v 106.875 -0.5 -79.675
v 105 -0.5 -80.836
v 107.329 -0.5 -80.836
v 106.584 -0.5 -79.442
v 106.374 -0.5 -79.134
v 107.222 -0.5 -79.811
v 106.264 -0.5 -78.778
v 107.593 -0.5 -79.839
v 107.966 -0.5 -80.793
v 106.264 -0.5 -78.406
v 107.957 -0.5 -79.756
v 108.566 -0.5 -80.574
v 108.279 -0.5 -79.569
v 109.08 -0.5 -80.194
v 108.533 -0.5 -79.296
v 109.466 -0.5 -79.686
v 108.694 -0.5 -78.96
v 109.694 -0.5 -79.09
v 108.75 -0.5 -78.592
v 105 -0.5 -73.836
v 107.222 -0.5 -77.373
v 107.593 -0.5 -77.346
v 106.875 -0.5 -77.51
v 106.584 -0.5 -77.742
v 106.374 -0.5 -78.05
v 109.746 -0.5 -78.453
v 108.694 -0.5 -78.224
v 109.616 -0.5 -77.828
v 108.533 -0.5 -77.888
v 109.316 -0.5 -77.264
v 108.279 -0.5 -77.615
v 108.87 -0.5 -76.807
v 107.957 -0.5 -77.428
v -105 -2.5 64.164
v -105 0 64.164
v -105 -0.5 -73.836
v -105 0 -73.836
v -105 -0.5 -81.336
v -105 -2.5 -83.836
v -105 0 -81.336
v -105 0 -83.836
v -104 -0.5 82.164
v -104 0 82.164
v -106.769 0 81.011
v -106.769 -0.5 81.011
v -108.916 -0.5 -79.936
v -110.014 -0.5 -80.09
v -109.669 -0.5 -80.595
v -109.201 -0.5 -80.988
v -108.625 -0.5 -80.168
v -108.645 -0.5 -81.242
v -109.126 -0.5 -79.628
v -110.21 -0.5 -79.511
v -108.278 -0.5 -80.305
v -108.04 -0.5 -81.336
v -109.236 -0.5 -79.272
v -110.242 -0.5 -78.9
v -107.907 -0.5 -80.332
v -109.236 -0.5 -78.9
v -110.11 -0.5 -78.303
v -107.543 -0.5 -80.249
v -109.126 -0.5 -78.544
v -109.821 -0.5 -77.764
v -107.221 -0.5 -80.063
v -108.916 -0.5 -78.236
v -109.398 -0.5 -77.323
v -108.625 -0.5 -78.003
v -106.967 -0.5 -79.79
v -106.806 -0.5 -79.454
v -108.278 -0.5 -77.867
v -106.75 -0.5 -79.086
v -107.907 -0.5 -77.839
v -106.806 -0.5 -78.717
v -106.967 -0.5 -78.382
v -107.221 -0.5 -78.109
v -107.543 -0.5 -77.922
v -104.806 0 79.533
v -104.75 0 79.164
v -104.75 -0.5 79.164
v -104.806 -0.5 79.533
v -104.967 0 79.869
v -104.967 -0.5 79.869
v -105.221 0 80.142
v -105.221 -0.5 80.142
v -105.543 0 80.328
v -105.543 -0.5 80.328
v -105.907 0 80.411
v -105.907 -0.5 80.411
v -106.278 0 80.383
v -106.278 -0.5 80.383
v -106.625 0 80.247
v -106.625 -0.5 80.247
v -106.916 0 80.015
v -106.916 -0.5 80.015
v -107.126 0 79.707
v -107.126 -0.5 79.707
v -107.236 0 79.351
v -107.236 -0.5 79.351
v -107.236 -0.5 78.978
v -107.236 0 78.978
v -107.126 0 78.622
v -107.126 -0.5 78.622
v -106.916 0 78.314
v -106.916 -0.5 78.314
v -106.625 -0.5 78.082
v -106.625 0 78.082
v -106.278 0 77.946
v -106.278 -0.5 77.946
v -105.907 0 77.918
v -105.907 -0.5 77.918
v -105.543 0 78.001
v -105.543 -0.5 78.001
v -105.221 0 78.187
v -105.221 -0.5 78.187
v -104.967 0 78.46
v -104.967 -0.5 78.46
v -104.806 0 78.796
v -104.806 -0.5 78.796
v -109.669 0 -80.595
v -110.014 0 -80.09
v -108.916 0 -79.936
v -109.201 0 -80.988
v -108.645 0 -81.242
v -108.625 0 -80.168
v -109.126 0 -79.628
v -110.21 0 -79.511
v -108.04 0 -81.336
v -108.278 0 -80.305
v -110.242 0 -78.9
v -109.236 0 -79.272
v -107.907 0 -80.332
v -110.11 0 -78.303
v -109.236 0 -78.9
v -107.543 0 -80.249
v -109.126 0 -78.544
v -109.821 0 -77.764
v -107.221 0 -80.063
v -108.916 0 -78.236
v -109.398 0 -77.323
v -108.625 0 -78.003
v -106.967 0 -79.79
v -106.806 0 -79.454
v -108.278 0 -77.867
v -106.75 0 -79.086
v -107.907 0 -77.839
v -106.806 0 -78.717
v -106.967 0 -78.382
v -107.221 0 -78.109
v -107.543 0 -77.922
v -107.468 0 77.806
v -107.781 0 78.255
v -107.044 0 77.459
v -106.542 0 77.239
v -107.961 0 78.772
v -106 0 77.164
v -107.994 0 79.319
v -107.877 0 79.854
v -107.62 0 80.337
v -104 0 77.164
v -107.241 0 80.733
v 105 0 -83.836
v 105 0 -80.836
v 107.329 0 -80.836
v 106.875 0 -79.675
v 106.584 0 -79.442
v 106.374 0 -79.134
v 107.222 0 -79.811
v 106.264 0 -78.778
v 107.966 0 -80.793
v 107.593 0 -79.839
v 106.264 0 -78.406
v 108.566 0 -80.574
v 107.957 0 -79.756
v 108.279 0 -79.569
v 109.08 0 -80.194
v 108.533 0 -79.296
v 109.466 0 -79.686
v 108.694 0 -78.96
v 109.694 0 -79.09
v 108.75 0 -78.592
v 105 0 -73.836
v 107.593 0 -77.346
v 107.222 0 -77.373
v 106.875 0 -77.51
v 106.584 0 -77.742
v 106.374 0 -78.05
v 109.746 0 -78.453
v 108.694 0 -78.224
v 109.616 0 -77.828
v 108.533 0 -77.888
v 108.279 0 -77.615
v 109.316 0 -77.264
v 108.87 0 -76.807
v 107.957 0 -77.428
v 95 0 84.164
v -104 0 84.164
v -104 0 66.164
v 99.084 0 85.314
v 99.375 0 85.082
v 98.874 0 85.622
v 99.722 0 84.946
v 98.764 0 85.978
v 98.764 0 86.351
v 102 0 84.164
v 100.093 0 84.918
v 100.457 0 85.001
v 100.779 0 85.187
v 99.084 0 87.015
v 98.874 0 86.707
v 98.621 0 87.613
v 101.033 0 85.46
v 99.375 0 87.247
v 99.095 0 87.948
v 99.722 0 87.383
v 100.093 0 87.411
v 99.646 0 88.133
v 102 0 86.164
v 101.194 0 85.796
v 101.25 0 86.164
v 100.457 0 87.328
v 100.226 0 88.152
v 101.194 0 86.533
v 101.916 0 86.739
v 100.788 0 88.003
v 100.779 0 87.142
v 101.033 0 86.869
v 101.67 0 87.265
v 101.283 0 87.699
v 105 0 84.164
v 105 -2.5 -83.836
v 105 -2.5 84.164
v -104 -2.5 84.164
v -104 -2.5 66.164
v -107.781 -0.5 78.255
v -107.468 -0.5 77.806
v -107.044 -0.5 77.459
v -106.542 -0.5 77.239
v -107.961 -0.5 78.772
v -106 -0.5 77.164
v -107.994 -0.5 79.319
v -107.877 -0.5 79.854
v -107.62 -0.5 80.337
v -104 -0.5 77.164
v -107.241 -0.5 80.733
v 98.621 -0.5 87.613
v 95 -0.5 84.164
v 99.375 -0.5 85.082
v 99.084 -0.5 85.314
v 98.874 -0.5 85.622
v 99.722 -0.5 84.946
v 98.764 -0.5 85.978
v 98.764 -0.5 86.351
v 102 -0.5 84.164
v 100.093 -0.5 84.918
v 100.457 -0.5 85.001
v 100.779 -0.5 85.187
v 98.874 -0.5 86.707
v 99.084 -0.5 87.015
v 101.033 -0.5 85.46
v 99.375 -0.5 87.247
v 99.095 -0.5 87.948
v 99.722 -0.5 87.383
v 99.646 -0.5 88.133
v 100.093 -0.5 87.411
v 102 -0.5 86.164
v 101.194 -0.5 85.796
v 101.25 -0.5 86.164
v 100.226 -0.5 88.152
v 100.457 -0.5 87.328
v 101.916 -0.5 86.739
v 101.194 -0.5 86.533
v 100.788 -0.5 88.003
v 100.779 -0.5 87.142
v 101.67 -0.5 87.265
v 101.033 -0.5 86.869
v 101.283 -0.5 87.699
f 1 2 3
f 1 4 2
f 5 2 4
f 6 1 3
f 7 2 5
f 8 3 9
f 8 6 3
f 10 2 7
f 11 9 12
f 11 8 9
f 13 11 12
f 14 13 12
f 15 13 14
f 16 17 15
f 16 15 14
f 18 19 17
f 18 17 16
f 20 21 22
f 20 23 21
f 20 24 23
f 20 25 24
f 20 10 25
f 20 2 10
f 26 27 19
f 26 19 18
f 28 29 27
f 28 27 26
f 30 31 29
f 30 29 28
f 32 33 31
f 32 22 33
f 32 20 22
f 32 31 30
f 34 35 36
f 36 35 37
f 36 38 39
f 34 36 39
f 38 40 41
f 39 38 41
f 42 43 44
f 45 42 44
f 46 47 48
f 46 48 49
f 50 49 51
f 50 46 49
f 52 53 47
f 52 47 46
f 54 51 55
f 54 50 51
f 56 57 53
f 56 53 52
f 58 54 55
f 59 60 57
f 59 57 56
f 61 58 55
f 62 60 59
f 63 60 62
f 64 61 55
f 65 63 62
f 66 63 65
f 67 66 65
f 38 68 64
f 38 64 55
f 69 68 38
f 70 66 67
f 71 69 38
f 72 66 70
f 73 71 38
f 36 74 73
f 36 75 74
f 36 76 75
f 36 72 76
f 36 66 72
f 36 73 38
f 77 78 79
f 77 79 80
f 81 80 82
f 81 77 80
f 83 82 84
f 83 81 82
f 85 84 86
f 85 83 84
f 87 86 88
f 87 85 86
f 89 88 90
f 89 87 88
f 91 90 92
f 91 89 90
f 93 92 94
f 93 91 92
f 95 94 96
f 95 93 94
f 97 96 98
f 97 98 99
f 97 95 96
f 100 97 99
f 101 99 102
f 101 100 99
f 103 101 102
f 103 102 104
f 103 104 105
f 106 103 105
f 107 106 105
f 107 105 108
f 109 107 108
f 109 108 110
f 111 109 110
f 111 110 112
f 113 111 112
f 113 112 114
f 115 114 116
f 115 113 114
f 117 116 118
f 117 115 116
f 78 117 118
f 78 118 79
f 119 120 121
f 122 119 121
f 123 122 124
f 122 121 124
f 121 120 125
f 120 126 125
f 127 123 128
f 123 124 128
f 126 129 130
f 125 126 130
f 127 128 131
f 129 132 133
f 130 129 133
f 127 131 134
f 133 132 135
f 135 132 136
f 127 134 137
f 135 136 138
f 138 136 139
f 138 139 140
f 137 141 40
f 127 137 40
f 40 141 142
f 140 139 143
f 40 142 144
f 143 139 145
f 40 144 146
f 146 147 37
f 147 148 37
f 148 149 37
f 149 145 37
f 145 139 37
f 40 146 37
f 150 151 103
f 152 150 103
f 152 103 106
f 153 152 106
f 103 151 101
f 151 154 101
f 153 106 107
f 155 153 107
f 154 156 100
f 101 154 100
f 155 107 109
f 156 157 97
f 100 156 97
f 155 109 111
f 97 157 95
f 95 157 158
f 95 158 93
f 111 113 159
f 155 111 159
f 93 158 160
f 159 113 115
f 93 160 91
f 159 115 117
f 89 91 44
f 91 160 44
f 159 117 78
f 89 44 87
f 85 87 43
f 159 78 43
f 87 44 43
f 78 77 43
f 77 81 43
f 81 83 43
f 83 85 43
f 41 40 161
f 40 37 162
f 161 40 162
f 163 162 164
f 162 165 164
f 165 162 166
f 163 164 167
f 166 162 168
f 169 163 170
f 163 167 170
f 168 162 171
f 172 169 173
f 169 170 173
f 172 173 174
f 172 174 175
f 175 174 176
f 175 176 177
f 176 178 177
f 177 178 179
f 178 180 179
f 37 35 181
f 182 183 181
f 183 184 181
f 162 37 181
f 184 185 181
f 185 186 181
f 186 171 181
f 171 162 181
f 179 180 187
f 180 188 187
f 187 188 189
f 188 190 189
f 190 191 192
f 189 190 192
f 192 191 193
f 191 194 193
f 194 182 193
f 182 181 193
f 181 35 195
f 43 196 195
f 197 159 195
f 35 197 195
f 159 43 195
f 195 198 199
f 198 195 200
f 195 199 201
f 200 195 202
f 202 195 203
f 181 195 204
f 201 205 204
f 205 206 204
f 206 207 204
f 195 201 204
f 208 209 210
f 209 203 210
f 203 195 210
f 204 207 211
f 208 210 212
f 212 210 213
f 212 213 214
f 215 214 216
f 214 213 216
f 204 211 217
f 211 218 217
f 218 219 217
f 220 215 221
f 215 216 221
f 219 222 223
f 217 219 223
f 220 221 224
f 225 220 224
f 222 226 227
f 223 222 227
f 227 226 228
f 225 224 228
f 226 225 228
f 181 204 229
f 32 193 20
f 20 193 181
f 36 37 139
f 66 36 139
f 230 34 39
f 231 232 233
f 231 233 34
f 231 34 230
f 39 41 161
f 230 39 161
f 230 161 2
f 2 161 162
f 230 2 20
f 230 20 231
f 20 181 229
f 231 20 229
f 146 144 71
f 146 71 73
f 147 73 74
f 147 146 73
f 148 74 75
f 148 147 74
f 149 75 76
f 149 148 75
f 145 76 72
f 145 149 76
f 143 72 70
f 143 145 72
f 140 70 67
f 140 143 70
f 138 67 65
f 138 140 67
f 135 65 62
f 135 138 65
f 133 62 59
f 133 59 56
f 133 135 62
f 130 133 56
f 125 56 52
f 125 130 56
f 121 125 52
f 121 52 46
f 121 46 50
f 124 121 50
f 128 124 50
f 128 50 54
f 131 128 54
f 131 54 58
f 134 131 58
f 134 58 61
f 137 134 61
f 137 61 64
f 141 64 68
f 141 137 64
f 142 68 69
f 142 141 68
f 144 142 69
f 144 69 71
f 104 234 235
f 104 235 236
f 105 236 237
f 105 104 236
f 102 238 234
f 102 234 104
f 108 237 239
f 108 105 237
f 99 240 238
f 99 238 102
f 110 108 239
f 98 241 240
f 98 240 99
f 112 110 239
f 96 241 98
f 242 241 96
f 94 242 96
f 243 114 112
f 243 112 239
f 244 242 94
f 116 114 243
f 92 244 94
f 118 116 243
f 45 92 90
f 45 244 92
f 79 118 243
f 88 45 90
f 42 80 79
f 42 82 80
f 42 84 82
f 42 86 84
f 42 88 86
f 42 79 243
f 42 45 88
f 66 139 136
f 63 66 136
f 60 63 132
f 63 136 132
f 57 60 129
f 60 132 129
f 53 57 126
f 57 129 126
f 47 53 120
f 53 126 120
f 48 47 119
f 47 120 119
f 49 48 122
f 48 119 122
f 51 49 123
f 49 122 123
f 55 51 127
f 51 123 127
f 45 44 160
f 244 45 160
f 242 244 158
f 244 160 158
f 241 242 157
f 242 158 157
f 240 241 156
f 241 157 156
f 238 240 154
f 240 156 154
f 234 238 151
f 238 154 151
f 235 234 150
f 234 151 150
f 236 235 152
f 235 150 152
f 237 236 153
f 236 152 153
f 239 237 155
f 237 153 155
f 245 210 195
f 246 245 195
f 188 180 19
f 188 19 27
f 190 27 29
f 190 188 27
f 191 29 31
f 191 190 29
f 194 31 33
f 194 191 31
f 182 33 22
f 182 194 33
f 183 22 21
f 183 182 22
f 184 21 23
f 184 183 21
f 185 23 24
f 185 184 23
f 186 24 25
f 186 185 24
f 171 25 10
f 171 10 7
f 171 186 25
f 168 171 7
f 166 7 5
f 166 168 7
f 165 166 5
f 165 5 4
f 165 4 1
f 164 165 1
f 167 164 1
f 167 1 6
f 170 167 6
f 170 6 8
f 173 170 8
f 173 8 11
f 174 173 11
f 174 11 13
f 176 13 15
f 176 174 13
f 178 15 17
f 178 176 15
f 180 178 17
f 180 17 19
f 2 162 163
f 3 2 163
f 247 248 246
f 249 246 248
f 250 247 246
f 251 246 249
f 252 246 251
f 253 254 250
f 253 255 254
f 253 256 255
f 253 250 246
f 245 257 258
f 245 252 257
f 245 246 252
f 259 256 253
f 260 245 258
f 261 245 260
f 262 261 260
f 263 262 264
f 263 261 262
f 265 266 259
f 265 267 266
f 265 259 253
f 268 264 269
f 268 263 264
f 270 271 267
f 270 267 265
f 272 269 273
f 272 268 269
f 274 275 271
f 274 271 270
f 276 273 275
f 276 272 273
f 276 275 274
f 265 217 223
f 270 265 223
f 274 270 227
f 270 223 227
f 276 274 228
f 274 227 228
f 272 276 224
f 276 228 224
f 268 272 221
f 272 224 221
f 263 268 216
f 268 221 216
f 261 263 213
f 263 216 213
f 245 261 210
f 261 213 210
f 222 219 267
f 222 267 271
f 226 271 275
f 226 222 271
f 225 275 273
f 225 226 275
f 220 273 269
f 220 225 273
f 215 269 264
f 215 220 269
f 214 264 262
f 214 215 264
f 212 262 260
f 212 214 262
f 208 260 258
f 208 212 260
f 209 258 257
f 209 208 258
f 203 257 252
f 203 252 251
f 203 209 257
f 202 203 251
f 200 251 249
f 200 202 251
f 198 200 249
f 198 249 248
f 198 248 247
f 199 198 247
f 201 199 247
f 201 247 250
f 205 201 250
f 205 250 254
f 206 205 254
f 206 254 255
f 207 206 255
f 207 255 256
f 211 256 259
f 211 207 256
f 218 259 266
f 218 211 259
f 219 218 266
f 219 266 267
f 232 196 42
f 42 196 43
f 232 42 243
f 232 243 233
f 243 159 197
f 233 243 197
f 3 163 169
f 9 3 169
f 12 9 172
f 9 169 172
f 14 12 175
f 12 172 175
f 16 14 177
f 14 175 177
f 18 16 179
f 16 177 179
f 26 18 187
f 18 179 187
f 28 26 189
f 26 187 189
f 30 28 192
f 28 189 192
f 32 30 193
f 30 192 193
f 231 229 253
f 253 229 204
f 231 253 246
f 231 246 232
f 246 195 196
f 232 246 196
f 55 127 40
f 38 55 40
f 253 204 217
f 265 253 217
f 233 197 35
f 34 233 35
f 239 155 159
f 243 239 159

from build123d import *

# Parameters (mm, degrees)
F1_DEPTH = 2.5
F0_R     = 1.25
F2_DEPTH = 0.5
F3_W     = 200
F3_H     = 151
F4_DEPTH = 0.1


with BuildPart() as f1:
    # F0 (on Front) → F1 (new body)
    with BuildSketch(Plane.XZ):
        Polygon((-105, -83.83553), (105, -83.83553), (105, -80.83553), (105, -73.83553), (105, 84.16447), (102, 84.16447), (95, 84.16447), (-104, 84.16447), (-104, 82.16447), (-104, 77.16447), (-104, 66.16447), (-105, 64.16447), (-105, -73.83553), (-105, -81.33553), align=None)
    extrude(amount=F1_DEPTH)

    # F0 (on Front) → F2 (join)
    with BuildSketch(Plane.XZ):
        with BuildLine():
            Line((95, 84.16447), (102, 84.16447))
            Line((102, 84.16447), (102, 86.16447))
            ThreePointArc((102, 86.16447), (100.787839, 88.00276), (98.62069, 87.612746))
            Line((98.62069, 87.612746), (95, 84.16447))
        make_face()
        with Locations((100, 86.16447)):
            Circle(F0_R, mode=Mode.SUBTRACT)
        with BuildLine():
            Line((-106, 77.16447), (-104, 77.16447))
            Line((-104, 77.16447), (-104, 82.16447))
            Line((-104, 82.16447), (-106.769231, 81.010624))
            ThreePointArc((-106.769231, 81.010624), (-107.961161, 78.772238), (-106, 77.16447))
        make_face()
        with Locations((-106, 79.16447)):
            Circle(F0_R, mode=Mode.SUBTRACT)
        with BuildLine():
            Line((-108.040458, -81.33553), (-105, -81.33553))
            Line((-105, -81.33553), (-105, -73.83553))
            Line((-105, -73.83553), (-109.39797, -77.32289))
            ThreePointArc((-109.39797, -77.32289), (-110.131335, -79.806943), (-108.040458, -81.33553))
        make_face()
        with Locations((-108, -79.085893)):
            Circle(F0_R, mode=Mode.SUBTRACT)
        with BuildLine():
            Line((105, -73.83553), (105, -80.83553))
            Line((105, -80.83553), (107.329069, -80.83553))
            ThreePointArc((107.329069, -80.83553), (109.601422, -79.396099), (108.870329, -76.807459))
            Line((108.870329, -76.807459), (105, -73.83553))
        make_face()
        with Locations((107.5, -78.592032)):
            Circle(F0_R, mode=Mode.SUBTRACT)
    extrude(amount=F2_DEPTH)

    # F3 (on Front) → F4 (join)
    with BuildSketch(Plane.XZ):
        with Locations((-1, 0.66447)):
            Rectangle(F3_W, F3_H)
    extrude(amount=F4_DEPTH)


solid = f1.part
